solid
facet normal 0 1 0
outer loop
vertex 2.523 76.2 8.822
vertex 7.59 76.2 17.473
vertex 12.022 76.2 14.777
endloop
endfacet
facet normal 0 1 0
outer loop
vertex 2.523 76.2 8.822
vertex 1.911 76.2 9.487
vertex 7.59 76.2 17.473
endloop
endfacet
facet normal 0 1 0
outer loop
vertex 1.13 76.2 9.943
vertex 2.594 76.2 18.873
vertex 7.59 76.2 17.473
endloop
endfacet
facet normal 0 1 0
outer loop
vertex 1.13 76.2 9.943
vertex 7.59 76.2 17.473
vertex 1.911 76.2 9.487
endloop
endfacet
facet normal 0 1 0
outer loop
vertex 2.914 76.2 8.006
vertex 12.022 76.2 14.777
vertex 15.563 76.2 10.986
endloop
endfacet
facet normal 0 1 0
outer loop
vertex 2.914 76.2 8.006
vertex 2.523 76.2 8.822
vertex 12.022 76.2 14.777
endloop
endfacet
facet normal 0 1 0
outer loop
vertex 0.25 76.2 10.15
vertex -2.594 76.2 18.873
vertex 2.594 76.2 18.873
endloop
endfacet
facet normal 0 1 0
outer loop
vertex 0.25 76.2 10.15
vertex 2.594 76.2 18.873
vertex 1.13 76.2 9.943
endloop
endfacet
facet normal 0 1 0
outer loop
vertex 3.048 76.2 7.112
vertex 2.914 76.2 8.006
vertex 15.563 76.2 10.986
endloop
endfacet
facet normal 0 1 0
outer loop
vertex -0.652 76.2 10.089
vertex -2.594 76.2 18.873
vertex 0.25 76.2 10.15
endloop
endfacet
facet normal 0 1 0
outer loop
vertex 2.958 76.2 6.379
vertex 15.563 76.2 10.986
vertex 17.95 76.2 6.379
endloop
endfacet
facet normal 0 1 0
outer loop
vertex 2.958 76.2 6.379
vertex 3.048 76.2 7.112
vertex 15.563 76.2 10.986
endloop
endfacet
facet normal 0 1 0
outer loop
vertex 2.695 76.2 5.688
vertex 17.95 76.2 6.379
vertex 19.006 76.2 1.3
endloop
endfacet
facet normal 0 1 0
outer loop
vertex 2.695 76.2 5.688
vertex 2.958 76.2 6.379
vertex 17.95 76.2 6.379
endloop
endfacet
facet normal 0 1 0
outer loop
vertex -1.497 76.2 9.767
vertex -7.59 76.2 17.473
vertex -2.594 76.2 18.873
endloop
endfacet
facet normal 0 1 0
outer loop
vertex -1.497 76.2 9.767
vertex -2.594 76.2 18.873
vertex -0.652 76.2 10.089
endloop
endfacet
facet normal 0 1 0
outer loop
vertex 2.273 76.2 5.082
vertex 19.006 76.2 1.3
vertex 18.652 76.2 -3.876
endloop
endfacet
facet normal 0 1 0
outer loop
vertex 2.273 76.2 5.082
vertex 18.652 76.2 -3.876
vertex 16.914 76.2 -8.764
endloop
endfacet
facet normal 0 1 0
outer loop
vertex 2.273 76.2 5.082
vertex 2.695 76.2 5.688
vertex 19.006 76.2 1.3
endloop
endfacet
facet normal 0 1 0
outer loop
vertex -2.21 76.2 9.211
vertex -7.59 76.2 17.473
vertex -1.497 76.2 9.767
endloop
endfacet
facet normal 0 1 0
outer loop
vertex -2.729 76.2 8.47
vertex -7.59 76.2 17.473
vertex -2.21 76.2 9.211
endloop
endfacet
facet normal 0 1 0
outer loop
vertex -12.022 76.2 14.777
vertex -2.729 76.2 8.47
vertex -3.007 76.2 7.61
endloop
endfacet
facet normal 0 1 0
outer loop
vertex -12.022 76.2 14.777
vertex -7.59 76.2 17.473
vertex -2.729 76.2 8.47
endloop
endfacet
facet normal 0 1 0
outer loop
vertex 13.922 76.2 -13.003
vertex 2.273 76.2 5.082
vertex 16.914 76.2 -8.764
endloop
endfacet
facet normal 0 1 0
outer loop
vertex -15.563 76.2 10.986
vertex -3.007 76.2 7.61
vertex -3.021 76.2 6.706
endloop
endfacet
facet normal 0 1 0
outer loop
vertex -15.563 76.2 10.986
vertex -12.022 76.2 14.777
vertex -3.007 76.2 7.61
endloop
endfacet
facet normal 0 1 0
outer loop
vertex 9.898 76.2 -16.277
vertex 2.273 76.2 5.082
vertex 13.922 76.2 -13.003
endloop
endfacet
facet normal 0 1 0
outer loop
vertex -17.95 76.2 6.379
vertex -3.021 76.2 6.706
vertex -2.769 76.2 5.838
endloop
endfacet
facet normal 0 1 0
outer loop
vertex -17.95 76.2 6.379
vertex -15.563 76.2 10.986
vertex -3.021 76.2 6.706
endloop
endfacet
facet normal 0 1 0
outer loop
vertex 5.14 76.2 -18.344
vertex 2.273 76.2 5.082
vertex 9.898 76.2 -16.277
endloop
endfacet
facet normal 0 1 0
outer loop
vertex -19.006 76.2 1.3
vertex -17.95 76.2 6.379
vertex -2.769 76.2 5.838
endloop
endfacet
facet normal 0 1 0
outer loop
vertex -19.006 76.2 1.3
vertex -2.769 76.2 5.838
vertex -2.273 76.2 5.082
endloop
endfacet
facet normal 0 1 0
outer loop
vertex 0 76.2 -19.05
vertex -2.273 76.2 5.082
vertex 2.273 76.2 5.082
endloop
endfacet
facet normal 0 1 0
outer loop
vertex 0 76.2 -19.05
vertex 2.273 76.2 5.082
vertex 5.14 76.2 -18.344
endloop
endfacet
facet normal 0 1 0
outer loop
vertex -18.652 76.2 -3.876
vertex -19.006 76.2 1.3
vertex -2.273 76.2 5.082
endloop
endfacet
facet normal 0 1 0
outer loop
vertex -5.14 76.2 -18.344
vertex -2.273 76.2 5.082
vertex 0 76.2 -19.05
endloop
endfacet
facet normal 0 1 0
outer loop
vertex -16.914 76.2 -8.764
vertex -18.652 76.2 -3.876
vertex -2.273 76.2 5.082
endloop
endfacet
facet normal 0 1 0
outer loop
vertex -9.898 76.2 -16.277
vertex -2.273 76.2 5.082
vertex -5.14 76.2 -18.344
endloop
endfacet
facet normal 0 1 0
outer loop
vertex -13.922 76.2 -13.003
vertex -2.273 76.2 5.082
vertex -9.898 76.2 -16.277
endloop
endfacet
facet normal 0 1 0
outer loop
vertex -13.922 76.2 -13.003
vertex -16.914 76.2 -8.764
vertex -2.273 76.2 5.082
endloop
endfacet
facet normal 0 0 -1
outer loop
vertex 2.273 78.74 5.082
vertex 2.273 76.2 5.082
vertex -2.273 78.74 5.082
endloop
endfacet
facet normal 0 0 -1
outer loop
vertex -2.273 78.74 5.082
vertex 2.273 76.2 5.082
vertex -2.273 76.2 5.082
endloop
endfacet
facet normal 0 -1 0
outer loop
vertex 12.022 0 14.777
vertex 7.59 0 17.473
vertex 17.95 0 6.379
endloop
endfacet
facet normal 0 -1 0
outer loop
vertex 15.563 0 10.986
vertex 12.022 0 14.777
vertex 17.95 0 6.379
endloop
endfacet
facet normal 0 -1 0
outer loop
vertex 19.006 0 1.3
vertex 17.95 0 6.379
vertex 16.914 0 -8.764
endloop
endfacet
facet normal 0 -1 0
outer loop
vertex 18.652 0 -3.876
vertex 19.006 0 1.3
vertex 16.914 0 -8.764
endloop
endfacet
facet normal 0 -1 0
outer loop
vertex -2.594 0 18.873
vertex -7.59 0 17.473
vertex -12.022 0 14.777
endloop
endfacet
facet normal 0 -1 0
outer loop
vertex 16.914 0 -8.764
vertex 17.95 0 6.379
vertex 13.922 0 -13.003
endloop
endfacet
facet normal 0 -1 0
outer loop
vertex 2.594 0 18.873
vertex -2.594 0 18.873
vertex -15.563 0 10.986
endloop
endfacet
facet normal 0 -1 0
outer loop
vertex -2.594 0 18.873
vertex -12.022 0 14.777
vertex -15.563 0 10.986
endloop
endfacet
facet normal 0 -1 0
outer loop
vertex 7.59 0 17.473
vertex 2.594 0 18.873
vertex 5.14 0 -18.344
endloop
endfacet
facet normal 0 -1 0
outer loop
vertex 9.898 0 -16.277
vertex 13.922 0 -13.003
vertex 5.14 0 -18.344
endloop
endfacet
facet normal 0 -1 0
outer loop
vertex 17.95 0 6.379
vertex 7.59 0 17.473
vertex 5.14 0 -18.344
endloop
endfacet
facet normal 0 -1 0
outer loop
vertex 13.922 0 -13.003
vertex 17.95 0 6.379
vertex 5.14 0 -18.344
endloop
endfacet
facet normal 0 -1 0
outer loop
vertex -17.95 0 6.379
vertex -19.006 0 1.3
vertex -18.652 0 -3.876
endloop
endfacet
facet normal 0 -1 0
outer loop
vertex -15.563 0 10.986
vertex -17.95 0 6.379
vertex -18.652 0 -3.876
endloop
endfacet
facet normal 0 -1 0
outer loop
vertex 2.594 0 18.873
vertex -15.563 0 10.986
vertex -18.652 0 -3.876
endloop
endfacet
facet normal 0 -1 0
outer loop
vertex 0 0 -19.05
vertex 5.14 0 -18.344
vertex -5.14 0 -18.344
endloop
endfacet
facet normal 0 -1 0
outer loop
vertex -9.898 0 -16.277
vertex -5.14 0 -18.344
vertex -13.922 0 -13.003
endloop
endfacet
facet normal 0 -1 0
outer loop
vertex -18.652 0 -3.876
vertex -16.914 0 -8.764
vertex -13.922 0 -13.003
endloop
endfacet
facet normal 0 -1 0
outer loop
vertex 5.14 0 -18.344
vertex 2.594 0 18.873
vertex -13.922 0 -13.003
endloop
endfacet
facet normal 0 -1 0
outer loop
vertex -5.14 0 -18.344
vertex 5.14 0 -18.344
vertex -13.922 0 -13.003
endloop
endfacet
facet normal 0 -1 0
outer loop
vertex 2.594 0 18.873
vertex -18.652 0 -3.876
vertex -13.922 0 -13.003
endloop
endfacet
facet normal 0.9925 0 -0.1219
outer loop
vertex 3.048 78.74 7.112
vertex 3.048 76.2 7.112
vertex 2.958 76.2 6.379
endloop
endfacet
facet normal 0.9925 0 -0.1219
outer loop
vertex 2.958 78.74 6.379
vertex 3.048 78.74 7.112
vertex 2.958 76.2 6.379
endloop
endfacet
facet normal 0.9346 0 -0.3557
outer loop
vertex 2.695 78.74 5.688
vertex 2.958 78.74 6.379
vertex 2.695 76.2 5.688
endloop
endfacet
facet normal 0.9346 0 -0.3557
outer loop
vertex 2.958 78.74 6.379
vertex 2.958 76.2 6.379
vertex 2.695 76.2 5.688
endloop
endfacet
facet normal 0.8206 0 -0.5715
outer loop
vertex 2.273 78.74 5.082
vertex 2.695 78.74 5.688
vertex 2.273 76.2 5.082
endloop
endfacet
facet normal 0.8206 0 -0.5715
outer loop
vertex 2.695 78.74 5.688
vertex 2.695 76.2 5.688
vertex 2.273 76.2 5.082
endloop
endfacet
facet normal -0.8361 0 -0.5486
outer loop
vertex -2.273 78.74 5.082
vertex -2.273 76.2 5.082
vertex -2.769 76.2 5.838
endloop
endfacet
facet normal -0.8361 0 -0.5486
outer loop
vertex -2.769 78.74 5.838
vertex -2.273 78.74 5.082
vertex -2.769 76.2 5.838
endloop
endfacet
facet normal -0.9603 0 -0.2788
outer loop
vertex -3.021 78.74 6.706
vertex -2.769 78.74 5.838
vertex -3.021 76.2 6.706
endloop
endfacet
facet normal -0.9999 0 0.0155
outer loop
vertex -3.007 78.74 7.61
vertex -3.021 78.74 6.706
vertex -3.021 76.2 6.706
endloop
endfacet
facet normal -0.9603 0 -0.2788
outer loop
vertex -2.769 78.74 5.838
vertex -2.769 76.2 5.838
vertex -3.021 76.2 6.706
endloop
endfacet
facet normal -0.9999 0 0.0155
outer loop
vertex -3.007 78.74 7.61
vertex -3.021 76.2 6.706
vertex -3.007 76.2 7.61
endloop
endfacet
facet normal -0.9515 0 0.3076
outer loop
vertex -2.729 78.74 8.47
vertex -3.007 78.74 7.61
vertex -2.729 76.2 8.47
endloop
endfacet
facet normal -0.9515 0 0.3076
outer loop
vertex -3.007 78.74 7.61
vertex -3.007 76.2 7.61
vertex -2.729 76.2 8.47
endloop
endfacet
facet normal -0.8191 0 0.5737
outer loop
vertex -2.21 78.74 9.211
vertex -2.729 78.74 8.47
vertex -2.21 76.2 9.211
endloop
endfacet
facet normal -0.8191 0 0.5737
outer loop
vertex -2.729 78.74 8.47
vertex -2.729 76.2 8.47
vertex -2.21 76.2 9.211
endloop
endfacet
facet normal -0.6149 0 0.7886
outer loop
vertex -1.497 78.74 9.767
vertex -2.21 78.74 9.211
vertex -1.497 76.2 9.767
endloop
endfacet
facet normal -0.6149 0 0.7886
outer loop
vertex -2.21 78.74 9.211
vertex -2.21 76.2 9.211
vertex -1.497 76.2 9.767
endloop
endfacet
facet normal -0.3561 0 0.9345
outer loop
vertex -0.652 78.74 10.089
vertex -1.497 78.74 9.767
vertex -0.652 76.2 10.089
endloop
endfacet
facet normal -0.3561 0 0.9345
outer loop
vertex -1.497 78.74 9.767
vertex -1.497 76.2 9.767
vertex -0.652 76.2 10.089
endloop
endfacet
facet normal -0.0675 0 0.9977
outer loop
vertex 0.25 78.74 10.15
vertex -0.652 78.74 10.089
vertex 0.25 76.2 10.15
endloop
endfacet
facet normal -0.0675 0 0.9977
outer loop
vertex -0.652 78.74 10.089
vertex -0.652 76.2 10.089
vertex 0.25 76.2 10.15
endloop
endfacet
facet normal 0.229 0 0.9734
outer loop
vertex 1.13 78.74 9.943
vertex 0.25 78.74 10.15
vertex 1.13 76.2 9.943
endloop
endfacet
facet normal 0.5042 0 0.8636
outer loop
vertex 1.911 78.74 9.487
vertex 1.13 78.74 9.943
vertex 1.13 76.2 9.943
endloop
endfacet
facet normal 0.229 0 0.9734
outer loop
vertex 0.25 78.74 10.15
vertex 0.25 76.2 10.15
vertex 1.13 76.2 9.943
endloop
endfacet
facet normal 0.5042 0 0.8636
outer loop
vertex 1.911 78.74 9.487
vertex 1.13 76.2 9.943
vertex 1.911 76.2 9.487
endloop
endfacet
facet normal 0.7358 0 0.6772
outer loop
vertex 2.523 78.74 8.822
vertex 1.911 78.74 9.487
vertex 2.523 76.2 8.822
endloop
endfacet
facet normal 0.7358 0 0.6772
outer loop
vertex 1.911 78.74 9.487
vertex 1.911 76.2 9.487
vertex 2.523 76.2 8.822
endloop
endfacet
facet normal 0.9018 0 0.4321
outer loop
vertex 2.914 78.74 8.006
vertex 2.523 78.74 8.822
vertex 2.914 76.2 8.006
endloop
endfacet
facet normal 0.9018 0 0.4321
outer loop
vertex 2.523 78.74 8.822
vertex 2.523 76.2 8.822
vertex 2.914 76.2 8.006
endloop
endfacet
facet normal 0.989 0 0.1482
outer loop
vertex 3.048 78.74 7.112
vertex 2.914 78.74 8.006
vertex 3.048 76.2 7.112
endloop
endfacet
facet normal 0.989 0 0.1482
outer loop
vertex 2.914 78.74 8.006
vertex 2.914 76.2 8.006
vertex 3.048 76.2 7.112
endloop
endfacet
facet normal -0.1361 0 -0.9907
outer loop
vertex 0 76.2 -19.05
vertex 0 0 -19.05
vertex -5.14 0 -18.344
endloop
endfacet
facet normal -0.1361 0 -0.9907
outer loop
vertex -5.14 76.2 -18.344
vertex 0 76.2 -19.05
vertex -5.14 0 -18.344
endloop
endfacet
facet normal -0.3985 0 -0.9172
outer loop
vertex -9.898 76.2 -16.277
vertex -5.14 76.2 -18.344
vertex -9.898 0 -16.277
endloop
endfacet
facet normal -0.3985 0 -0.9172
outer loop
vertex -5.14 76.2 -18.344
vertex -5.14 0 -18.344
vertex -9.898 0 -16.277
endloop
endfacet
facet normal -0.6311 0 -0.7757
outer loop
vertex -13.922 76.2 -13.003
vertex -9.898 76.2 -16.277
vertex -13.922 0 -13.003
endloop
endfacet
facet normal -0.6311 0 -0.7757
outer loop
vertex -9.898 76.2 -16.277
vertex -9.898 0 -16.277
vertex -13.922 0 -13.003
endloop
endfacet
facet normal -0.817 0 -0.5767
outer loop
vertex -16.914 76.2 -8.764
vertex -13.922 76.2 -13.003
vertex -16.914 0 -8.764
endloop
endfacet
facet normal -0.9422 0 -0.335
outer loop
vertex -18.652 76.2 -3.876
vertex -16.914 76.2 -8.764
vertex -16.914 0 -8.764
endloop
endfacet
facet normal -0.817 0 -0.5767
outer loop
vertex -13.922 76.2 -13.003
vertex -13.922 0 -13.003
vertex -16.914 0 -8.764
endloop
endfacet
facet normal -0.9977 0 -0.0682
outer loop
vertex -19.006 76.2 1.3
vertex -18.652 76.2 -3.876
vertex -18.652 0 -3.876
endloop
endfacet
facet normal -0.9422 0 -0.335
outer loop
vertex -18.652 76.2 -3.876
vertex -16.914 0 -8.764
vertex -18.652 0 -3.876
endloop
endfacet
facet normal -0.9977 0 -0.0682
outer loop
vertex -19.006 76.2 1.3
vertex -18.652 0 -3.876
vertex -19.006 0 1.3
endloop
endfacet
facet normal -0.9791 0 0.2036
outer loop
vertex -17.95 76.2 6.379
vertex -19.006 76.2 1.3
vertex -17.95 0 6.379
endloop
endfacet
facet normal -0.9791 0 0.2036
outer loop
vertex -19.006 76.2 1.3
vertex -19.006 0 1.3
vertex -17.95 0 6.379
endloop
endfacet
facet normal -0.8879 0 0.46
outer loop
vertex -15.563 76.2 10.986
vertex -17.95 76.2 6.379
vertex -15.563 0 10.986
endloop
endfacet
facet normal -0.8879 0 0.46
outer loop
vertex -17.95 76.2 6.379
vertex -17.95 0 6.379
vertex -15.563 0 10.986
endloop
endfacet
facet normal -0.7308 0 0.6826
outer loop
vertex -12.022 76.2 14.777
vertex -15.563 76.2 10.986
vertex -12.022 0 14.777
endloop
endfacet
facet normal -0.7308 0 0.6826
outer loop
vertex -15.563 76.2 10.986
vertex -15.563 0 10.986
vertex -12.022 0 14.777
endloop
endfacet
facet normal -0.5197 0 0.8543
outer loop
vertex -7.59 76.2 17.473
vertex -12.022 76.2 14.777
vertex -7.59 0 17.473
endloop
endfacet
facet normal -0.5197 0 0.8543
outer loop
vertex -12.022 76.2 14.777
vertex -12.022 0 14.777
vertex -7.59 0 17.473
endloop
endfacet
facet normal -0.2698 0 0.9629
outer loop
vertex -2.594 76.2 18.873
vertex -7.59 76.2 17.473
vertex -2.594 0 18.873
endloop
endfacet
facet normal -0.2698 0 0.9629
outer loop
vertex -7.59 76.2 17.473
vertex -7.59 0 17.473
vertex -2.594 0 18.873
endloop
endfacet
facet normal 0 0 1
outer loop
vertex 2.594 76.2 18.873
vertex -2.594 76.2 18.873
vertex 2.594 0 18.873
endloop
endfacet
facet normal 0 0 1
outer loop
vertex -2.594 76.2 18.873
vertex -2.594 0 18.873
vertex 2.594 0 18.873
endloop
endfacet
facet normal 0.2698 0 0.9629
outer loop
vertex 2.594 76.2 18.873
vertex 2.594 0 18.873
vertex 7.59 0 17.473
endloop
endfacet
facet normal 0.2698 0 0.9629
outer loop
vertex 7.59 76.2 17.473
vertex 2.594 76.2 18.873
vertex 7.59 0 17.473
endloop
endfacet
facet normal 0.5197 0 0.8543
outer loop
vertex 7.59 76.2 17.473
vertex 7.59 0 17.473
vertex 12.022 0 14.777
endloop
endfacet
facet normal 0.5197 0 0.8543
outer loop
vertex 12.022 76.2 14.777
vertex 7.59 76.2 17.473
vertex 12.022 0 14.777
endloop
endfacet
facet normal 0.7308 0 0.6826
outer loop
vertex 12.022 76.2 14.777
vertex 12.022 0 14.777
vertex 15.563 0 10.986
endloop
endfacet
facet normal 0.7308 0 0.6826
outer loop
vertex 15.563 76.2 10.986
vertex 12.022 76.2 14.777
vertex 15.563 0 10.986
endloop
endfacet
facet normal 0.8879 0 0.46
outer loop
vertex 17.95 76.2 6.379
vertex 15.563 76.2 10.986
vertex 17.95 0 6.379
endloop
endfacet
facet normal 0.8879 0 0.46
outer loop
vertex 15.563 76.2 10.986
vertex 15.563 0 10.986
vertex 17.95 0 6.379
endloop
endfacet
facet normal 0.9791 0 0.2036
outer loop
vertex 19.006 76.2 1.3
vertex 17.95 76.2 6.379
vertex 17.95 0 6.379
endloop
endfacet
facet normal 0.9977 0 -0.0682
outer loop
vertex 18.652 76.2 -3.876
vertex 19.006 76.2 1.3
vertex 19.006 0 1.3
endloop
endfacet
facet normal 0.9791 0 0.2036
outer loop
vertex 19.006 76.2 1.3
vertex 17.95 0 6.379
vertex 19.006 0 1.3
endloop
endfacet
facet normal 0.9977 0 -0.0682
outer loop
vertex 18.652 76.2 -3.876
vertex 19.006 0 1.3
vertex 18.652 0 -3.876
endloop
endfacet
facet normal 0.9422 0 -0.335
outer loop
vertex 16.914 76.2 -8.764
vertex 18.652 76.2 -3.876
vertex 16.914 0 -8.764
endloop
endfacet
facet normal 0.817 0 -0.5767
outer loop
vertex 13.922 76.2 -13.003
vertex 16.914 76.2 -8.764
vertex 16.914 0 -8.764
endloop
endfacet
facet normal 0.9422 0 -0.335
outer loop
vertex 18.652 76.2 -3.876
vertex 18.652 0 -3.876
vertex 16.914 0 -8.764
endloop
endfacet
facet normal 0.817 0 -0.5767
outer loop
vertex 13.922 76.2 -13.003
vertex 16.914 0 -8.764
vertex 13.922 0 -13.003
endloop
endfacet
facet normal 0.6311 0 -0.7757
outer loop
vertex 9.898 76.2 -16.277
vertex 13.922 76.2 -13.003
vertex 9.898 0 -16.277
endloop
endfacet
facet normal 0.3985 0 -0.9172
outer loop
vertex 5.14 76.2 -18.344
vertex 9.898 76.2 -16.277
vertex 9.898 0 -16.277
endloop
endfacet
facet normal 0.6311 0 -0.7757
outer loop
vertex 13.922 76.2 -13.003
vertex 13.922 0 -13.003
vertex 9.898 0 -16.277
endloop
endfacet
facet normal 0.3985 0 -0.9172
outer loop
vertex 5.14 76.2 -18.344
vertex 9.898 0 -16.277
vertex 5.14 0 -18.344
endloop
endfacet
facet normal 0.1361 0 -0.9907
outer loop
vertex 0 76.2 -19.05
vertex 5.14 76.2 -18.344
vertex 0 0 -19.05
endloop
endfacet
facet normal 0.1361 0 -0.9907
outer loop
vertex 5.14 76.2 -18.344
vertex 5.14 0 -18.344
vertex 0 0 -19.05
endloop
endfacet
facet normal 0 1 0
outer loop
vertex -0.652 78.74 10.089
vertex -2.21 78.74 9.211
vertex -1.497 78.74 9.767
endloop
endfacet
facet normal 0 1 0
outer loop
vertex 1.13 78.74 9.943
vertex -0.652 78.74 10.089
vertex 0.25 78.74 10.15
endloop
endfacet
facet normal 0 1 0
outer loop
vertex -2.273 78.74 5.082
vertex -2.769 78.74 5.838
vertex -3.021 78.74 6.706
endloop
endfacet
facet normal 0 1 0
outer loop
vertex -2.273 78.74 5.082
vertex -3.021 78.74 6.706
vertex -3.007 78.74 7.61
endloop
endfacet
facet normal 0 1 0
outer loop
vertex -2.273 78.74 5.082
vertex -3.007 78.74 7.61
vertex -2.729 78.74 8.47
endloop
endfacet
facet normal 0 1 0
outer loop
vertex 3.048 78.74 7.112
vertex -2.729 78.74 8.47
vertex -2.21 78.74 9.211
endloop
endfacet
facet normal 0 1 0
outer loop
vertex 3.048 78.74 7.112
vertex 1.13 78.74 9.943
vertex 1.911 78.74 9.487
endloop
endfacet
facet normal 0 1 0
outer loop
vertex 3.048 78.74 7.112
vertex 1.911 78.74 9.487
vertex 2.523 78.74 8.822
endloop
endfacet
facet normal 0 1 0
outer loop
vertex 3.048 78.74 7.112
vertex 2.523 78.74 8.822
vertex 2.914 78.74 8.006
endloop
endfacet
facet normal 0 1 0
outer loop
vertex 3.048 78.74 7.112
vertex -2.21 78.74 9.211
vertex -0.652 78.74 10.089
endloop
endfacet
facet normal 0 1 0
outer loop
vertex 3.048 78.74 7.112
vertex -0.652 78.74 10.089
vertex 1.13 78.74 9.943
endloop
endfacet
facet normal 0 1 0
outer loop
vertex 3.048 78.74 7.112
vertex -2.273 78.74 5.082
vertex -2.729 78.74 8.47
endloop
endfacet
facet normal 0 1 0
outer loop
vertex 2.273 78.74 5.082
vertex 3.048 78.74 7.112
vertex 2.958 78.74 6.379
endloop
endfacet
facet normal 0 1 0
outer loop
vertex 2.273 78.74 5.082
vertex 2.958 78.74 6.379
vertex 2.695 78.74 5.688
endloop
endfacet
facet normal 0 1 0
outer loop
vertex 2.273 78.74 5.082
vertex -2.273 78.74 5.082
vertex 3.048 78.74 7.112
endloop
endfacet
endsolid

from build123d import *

# Parameters (mm, degrees)
SKETCH1_R           = 19.05
BOSS_EXTRUDE1_DEPTH = 76.2
BOSS_EXTRUDE3_DEPTH = 2.54


with BuildPart() as part:
    # Sketch1 → Boss-Extrude1 (new body)
    with BuildSketch(Plane(origin=(0, 0, 0), x_dir=(1, 0, 0), z_dir=(0, 1, 0))):
        with Locations(Location((0, 0, 0), (0, 0, 90))):
            Circle(SKETCH1_R)
    extrude(amount=BOSS_EXTRUDE1_DEPTH)

    # Sketch2 → Boss-Extrude3 (add)
    with BuildSketch(Plane(origin=(0, 76.2, 0), x_dir=(1, 0, 0), z_dir=(0, 1, 0))):
        with BuildLine():
            Line((2.273328114, -5.081659317), (0, -5.081659317))
            Line((0, -5.081659317), (-2.273328114, -5.081659317))
            ThreePointArc((-2.273328114, -5.081659317), (-1.086554166, -9.959754211), (3.048, -7.112))
            ThreePointArc((3.048, -7.112), (2.847754211, -6.025445834), (2.273328114, -5.081659317))
        make_face()
    extrude(amount=BOSS_EXTRUDE3_DEPTH)


solid = part.part
